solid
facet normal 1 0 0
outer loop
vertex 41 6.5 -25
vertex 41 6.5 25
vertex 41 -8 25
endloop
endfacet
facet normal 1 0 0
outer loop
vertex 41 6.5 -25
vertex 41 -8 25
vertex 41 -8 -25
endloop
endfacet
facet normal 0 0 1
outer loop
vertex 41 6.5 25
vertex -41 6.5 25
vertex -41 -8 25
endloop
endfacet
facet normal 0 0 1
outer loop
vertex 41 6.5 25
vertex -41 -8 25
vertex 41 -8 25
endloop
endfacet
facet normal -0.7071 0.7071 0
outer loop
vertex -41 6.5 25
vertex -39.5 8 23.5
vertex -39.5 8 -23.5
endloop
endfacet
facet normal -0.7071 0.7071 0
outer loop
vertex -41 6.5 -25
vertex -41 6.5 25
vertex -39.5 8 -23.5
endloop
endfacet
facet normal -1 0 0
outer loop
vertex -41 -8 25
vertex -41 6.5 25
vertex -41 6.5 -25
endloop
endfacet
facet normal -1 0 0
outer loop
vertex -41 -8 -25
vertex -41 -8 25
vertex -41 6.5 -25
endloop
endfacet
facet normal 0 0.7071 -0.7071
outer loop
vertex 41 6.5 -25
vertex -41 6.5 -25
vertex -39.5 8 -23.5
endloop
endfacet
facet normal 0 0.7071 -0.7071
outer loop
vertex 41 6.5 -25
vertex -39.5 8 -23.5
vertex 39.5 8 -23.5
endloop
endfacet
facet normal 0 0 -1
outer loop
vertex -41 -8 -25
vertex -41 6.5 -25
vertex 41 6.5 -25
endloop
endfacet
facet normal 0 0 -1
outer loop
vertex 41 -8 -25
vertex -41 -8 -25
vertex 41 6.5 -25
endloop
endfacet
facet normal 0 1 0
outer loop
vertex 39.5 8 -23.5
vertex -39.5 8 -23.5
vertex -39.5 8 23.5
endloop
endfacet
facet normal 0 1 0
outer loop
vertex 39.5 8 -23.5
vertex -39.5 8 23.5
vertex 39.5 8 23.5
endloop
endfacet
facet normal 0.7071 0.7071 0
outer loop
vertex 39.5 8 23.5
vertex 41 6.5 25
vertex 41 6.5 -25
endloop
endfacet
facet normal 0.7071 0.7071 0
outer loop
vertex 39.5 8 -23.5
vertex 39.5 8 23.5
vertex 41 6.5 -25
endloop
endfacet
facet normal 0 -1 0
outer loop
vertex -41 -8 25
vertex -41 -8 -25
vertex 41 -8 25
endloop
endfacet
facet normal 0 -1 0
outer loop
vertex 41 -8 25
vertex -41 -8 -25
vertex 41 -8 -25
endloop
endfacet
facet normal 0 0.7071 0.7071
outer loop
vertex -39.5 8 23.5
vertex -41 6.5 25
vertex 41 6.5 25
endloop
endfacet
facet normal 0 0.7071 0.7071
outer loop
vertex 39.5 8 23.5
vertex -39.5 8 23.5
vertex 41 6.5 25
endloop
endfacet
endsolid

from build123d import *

# Parameters (mm, degrees)
SKETCH1_W           = 82
SKETCH1_H           = 50
BOSS_EXTRUDE1_DEPTH = 8
CHAMFER1_SIZE       = 1.5


with BuildPart() as part:
    # Sketch1 → Boss-Extrude1 (new, symmetric)
    with BuildSketch(Plane(origin=(0, 0, 0), x_dir=(1, 0, 0), z_dir=(0, 1, 0))):
        Rectangle(SKETCH1_W, SKETCH1_H)
    extrude(amount=BOSS_EXTRUDE1_DEPTH, both=True)

    # Chamfer1
    chamfer1_edges = [part.edges().sort_by_distance(p)[0] for p in [
        (-41, 8, 0),
        (0, 8, 25),
        (41, 8, 0),
        (0, 8, -25),
    ]]
    chamfer(chamfer1_edges, length=CHAMFER1_SIZE)


solid = part.part
